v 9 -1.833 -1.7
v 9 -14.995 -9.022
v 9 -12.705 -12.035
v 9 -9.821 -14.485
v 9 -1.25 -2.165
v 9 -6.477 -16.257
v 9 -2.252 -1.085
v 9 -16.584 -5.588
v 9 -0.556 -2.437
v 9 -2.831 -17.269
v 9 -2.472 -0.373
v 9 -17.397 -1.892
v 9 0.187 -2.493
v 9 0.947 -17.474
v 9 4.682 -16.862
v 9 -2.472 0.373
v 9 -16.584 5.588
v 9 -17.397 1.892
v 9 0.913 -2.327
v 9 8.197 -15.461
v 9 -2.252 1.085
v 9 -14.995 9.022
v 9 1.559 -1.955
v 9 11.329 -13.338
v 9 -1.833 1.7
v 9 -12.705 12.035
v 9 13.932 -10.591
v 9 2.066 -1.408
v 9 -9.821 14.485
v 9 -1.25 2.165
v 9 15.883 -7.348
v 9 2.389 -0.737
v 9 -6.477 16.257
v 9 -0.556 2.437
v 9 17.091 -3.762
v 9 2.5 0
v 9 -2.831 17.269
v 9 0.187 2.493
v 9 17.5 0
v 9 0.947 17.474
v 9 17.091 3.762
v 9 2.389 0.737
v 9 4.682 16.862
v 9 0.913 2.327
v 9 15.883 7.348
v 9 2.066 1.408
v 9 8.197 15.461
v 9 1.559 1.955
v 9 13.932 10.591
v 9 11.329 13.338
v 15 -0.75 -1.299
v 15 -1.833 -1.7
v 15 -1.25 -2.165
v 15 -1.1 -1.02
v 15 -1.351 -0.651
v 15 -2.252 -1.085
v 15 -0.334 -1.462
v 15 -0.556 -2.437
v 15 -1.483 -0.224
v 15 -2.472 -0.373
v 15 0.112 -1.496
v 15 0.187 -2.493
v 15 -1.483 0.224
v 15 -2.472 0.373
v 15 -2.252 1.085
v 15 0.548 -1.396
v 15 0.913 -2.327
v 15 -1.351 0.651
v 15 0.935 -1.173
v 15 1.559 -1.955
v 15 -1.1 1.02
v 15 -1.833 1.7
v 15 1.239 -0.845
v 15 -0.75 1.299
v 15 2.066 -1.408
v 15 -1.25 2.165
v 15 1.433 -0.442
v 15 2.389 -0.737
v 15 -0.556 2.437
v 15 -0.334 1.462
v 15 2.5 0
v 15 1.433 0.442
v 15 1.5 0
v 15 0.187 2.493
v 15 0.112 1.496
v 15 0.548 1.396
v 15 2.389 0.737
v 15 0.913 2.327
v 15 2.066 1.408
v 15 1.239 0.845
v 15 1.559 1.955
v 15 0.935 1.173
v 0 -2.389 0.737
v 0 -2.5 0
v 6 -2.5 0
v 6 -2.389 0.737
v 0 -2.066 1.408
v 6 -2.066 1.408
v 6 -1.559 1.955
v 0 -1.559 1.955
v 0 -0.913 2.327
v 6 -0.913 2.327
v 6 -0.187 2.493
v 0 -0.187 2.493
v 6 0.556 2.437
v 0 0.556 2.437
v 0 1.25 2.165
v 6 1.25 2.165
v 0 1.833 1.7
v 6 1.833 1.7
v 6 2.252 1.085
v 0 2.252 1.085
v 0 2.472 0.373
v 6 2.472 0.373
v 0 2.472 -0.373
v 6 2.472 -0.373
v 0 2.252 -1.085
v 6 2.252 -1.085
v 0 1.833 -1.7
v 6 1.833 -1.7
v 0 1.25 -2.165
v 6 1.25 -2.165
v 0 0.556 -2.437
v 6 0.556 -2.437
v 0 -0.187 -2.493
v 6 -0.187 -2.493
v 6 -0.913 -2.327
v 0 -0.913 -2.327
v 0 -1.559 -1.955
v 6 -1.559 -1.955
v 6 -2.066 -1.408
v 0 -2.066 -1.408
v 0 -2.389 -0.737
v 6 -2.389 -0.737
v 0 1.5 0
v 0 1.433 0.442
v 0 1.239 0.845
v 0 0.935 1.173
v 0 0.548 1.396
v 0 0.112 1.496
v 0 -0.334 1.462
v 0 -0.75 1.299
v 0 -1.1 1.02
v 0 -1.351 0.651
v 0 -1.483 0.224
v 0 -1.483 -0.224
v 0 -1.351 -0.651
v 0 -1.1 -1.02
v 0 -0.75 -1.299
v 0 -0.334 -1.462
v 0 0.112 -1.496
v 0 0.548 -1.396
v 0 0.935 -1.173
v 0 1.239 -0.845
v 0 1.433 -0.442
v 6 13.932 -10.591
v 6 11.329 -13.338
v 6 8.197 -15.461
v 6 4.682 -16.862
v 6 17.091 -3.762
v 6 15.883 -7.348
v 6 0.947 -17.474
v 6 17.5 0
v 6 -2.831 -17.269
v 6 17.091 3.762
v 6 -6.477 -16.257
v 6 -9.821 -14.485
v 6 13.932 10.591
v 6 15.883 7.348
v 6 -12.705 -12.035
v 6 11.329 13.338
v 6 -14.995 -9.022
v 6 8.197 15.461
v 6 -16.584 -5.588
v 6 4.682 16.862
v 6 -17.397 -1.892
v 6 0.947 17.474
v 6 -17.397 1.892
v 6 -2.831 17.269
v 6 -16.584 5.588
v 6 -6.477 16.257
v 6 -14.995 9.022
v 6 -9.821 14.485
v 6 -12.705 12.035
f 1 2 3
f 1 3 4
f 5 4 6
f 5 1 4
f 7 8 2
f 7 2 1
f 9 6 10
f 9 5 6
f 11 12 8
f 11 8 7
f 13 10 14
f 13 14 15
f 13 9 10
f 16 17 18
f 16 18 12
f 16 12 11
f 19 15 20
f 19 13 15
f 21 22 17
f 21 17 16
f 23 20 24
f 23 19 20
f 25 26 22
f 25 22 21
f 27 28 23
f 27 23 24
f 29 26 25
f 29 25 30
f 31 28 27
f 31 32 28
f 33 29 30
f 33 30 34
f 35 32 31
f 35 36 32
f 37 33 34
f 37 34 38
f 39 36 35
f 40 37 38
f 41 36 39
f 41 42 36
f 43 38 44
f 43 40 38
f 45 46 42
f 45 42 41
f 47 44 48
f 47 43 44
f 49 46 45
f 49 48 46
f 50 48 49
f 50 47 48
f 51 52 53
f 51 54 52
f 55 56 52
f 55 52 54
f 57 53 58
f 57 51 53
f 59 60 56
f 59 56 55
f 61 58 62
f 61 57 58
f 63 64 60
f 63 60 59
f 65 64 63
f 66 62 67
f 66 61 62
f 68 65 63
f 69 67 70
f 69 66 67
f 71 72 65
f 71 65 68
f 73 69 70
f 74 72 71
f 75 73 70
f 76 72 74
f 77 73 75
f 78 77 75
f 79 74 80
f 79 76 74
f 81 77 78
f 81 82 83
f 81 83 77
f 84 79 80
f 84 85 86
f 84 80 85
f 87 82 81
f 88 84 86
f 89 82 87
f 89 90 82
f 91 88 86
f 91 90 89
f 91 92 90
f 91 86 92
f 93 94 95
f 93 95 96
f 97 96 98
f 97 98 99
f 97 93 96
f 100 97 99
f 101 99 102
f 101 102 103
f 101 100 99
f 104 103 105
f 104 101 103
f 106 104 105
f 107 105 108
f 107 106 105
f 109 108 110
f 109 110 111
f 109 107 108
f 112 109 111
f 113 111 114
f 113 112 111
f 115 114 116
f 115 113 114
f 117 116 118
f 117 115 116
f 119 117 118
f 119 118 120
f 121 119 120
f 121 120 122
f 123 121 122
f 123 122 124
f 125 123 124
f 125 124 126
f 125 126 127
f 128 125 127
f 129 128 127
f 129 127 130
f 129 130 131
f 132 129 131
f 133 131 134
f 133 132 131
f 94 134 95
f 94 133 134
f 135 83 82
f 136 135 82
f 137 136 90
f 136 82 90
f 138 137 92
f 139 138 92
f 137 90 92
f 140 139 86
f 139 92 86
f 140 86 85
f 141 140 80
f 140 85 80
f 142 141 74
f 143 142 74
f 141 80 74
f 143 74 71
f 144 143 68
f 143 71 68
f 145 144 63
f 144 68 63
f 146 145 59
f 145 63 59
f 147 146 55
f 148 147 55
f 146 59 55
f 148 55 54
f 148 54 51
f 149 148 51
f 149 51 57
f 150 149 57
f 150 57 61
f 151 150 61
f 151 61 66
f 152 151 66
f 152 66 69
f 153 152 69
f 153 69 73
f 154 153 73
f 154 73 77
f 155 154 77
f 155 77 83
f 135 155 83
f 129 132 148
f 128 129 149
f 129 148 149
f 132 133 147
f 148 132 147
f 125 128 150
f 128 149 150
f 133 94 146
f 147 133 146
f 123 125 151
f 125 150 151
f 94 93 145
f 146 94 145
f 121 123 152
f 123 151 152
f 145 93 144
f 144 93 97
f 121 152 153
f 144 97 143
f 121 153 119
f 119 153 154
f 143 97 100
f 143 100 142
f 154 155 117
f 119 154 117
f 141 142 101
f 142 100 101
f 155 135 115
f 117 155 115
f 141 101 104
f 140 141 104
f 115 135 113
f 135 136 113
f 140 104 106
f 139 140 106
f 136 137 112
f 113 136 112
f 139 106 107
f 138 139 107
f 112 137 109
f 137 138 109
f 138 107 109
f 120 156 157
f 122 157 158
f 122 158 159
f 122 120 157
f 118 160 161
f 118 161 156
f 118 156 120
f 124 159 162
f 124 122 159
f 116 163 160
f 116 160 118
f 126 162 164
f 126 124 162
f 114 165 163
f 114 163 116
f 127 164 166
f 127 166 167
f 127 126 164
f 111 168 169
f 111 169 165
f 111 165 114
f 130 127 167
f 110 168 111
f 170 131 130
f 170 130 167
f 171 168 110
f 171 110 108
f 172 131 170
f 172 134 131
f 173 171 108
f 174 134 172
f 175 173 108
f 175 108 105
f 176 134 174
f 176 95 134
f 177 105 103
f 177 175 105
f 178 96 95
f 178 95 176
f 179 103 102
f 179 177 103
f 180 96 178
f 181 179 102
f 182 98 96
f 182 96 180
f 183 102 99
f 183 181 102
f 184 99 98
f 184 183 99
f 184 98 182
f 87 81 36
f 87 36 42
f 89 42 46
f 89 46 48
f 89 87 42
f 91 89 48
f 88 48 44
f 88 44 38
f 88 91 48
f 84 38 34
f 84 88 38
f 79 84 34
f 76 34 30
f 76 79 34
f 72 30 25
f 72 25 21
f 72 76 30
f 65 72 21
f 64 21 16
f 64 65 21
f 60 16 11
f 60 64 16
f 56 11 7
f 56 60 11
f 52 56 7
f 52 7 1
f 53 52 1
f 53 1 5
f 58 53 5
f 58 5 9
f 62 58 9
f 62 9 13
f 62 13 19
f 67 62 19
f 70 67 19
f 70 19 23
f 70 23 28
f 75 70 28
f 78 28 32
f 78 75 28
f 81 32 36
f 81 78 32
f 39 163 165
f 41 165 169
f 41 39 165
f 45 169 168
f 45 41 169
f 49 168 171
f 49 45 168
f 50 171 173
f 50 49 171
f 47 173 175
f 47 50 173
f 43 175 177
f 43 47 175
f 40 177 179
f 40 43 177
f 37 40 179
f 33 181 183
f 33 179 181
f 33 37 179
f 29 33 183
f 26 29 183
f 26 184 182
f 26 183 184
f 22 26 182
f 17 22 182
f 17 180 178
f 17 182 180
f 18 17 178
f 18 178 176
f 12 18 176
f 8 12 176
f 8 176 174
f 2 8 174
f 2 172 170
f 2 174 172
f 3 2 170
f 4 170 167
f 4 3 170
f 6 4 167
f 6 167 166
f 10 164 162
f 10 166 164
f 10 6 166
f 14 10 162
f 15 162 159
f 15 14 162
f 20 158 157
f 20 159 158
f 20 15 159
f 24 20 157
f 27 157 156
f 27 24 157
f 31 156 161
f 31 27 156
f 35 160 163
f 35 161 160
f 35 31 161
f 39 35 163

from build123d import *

# Parameters (mm, degrees)
F0_R     = 20
F1_DEPTH = 15
F2_R     = 17.5
F2_R_2   = 2.5
F3_DEPTH = 6
F4_R     = 1.5
F5_DEPTH = 25
F6_R     = 17.5
F6_R_2   = 2.5
F7_DEPTH = 6
F8_DEPTH = 25


with BuildPart() as f1:
    # F0 (on Right) → F1 (new body)
    with BuildSketch(Plane.YZ):
        Circle(F0_R)
    extrude(amount=F1_DEPTH)

    # F2 (on face) → F3 (cut)
    with BuildSketch(Plane.YZ.offset(15)):
        Circle(F2_R)
        Circle(F2_R_2, mode=Mode.SUBTRACT)
    extrude(amount=-F3_DEPTH, mode=Mode.SUBTRACT)

    # F4 (on face) → F5 (cut)
    with BuildSketch(Plane.YZ.offset(15)):
        Circle(F4_R)
    extrude(amount=-F5_DEPTH, mode=Mode.SUBTRACT)

    # F6 (on face) → F7 (cut)
    with BuildSketch(Plane(origin=(0, 0, 0), x_dir=(0, -1, 0), z_dir=(-1, 0, 0))):
        Circle(F6_R)
        Circle(F6_R_2, mode=Mode.SUBTRACT)
    extrude(amount=-F7_DEPTH, mode=Mode.SUBTRACT)

    # F8 (cut): a face of the model
    f8_faces = [f1.faces().sort_by_distance(p)[0] for p in [
        (15, -19.4343145751, 0),
    ]]
    extrude(f8_faces, amount=-F8_DEPTH, mode=Mode.SUBTRACT)


solid = f1.part
